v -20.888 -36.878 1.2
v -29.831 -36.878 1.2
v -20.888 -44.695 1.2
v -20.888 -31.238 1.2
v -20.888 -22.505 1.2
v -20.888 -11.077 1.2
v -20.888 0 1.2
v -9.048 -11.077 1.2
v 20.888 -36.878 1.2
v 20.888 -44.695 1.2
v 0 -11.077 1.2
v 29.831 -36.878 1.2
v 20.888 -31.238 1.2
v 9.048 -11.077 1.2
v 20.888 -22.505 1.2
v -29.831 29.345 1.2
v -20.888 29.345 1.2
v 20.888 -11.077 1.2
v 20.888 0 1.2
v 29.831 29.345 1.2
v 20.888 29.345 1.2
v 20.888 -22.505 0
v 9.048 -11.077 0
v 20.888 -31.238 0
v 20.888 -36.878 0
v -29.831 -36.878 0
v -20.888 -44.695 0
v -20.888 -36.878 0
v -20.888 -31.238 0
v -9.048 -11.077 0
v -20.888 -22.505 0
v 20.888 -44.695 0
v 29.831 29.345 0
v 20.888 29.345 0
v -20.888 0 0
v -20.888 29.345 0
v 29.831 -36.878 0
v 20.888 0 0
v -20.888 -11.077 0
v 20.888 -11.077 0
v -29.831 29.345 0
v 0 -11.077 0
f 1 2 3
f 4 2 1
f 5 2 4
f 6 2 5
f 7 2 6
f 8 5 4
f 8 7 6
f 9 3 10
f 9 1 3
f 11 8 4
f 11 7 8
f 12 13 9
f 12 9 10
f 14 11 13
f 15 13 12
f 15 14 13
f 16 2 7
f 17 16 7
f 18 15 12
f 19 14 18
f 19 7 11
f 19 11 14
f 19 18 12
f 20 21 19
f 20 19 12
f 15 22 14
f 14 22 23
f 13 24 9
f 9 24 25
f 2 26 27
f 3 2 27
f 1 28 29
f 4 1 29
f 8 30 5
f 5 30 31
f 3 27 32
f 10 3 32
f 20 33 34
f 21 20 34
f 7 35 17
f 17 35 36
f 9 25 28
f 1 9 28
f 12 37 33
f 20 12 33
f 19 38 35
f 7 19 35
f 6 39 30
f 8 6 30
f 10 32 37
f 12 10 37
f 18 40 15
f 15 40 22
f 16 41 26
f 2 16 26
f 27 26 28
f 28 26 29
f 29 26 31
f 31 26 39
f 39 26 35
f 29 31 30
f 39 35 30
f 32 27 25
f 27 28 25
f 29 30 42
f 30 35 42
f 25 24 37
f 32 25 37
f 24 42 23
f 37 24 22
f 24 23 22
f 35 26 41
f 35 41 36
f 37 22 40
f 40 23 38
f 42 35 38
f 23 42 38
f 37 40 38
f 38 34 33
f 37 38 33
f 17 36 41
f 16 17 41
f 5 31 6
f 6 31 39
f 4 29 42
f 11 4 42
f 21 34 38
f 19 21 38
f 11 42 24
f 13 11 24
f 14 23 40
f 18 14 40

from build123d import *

# Parameters (mm, degrees)
F1_DEPTH = 1.2


with BuildPart() as f1:
    # F0 (on Top) → F1 (new body)
    with BuildSketch(Plane.XY):
        Polygon((20.888254, -36.877837), (-20.888254, -36.877837), (-20.888254, -31.238344), (-20.888254, -22.505017), (-20.888254, -11.076983), (-20.888254, 0), (-20.888254, 29.34467), (-29.831249, 29.34467), (-29.831249, -36.877837), (-20.888254, -44.694535), (0, -44.694535), (20.888254, -44.694535), (29.831249, -36.877837), (29.831249, 29.34467), (20.888254, 29.34467), (20.888254, 0), (20.888254, -11.076983), (20.888254, -22.505017), (20.888254, -31.238344), align=None)
        Polygon((-9.048197, -11.076983), (0, -11.076983), (9.048197, -11.076983), (20.888254, -11.076983), (20.888254, 0), (-20.888254, 0), (-20.888254, -11.076983), align=None)
        Polygon((-20.888254, -22.505017), (-20.888254, -31.238344), (0, -11.076983), (-9.048197, -11.076983), align=None)
        Polygon((0, -11.076983), (20.888254, -31.238344), (20.888254, -22.505017), (9.048197, -11.076983), align=None)
    extrude(amount=F1_DEPTH)


solid = f1.part
